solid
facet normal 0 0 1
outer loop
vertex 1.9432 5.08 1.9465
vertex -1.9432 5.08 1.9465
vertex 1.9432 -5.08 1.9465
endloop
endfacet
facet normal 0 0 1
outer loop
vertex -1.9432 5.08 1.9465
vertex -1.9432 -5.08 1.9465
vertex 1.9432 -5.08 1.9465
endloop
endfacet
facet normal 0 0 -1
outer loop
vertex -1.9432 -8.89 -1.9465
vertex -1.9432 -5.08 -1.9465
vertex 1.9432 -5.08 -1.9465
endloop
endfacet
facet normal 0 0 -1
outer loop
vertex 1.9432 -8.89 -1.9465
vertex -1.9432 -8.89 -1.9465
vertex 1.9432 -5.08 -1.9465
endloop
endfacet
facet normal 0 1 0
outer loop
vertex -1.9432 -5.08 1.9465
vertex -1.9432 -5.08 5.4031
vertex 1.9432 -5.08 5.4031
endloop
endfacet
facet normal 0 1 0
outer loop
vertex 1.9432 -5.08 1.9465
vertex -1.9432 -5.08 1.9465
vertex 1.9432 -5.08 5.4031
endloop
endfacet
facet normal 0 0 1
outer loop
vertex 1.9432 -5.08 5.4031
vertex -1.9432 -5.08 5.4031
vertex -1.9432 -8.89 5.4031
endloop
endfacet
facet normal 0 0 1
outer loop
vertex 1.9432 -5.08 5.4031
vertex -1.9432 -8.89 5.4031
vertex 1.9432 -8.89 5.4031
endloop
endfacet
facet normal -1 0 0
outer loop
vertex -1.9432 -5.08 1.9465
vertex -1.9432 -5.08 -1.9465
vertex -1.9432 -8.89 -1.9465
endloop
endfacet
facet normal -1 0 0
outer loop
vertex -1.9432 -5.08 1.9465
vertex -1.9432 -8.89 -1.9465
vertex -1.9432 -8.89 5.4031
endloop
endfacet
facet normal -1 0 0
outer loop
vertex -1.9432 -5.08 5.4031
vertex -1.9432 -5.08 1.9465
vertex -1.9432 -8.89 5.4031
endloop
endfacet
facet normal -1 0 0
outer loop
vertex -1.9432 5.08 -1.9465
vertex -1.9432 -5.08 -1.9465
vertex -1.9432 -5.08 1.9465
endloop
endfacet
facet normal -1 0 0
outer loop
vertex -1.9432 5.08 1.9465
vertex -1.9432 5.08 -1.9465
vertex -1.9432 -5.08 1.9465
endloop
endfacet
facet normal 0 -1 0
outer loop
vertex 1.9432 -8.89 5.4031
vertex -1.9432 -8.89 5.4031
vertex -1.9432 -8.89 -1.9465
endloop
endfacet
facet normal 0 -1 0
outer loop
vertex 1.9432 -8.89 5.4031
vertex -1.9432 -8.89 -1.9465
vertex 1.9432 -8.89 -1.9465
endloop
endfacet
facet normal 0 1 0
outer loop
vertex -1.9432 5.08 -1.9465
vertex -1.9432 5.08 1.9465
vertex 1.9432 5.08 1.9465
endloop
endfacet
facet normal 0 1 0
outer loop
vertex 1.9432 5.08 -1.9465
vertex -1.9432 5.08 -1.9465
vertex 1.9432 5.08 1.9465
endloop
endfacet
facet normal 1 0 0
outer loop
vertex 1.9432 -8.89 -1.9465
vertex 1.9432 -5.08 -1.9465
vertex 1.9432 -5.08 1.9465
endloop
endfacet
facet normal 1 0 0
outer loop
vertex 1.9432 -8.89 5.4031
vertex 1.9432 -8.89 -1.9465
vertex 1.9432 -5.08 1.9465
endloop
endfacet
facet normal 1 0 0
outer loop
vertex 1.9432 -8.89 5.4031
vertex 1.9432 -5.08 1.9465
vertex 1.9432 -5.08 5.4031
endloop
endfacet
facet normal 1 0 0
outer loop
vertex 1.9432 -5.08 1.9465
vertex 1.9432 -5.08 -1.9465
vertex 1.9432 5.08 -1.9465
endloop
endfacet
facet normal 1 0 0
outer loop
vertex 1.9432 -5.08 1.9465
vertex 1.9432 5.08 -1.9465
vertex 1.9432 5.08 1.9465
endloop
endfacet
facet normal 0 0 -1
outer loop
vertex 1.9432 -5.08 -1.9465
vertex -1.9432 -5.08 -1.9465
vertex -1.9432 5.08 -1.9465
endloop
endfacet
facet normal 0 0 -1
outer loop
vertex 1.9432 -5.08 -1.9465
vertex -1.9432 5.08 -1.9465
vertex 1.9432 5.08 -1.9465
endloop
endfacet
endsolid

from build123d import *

# Parameters (mm, degrees)
F0_W          = 3.886314
F0_H          = 3.89309
F1_DEPTH      = 5.08
F1_DEPTH_BACK = 5.08
F2_W          = 3.886314
F2_H          = 7.349639
F3_DEPTH      = 3.81


with BuildPart() as f1:
    # F0 (on Front) → F1 (new body, two sides)
    with BuildSketch(Plane.XZ) as f1_sk:
        Rectangle(F0_W, F0_H)
    extrude(amount=F1_DEPTH)
    extrude(f1_sk.sketch, amount=-F1_DEPTH_BACK)

    # F2 (on face) → F3 (join)
    with BuildSketch(Plane.XZ.offset(5.08)):
        with Locations((0, 1.728274)):
            Rectangle(F2_W, F2_H)
    extrude(amount=F3_DEPTH)


solid = f1.part
